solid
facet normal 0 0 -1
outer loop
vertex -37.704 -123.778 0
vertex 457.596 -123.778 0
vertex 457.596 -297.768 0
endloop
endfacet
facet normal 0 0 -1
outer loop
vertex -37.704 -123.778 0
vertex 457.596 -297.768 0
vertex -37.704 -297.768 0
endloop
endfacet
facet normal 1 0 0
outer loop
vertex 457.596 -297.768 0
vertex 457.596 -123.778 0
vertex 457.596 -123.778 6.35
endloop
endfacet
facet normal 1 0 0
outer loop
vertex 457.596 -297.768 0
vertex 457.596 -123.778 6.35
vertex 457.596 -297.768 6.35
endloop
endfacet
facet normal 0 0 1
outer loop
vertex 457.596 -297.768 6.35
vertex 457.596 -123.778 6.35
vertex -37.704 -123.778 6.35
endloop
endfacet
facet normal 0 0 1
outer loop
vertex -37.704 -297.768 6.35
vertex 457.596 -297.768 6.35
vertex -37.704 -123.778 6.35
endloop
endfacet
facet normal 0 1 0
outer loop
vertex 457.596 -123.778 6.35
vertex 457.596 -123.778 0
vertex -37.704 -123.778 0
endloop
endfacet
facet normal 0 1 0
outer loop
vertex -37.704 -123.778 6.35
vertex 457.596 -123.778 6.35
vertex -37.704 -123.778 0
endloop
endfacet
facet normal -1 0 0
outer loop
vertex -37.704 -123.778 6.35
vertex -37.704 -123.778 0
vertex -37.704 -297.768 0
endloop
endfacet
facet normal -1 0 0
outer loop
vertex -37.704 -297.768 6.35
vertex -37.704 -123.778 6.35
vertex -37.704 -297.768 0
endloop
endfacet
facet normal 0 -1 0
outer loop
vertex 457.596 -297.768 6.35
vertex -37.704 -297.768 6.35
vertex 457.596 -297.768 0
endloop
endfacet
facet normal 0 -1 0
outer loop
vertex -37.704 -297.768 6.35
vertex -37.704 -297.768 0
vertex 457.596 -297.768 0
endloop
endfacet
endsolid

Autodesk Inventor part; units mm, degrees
ref_plane "YZ Plane" through (0, 0, 0) normal (1, 0, 0) x (0, 1, 0)
ref_plane "XZ Plane" through (0, 0, 0) normal (0, 1, 0) x (-1, 0, 0)
ref_plane "XY Plane" through (0, 0, 0) normal (0, 0, 1) x (1, 0, 0)
sketch "Sketch1" plane through (0, 0, 0) normal (0, 0, 1) x (1, 0, 0)
  line L0 (-37.7036, 22.272) -> (457.5964, 22.272)
  line L1 (457.5964, 22.272) -> (457.5964, -304.118)
  line L2 (457.5964, -304.118) -> (-37.7036, -304.118)
  line L3 (-37.7036, -304.118) -> (-37.7036, 22.272)
  point P0 (0, 0)
  dimension "d0" = 495.3
  dimension "d1" = 326.39
extrude "Extrusion1" add sketch "Sketch1" along normal blind 6.35
sketch "Sketch2" plane through (0, 0, 6.35) normal (0, 0, 1) x (1, 0, 0)
  line L0 (-37.7036, 22.272) -> (457.5964, 22.272) projected
  line L1 (-37.7036, 22.272) -> (-18.6536, 22.272)
  line L2 (-18.6536, 22.272) -> (-18.6536, 15.922)
  line L3 (-18.6536, 15.922) -> (-37.7036, 15.922)
  line L4 (-37.7036, 15.922) -> (-37.7036, 22.272)
  line L5 (-18.6536, 15.922) -> (32.1464, 15.922)
  line L6 (32.1464, 15.922) -> (32.1464, 22.272)
  line L7 (32.1464, 22.272) -> (-18.6536, 22.272)
  line L8 (-18.6536, 22.272) -> (-18.6536, 15.922)
  line L9 (32.1464, 15.922) -> (82.9464, 15.922)
  line L10 (82.9464, 15.922) -> (82.9464, 22.272)
  line L11 (82.9464, 22.272) -> (32.1464, 22.272)
  line L12 (32.1464, 22.272) -> (32.1464, 15.922)
  line L13 (82.9464, 15.922) -> (133.7464, 15.922)
  line L14 (133.7464, 15.922) -> (133.7464, 22.272)
  line L15 (133.7464, 22.272) -> (82.9464, 22.272)
  line L16 (82.9464, 22.272) -> (82.9464, 15.922)
  line L17 (133.7464, 15.922) -> (184.5464, 15.922)
  line L18 (184.5464, 15.922) -> (184.5464, 22.272)
  line L19 (184.5464, 22.272) -> (133.7464, 22.272)
  line L20 (133.7464, 22.272) -> (133.7464, 15.922)
  line L21 (184.5464, 15.922) -> (235.3464, 15.922)
  line L22 (235.3464, 15.922) -> (235.3464, 22.272)
  line L23 (235.3464, 22.272) -> (184.5464, 22.272)
  line L24 (184.5464, 22.272) -> (184.5464, 15.922)
  line L25 (235.3464, 15.922) -> (286.1464, 15.922)
  line L26 (286.1464, 15.922) -> (286.1464, 22.272)
  line L27 (286.1464, 22.272) -> (235.3464, 22.272)
  line L28 (235.3464, 22.272) -> (235.3464, 15.922)
  line L29 (286.1464, 15.922) -> (336.9464, 15.922)
  line L30 (336.9464, 15.922) -> (336.9464, 22.272)
  line L31 (336.9464, 22.272) -> (286.1464, 22.272)
  line L32 (286.1464, 22.272) -> (286.1464, 15.922)
  line L33 (336.9464, 15.922) -> (387.7464, 15.922)
  line L34 (387.7464, 15.922) -> (387.7464, 22.272)
  line L35 (387.7464, 22.272) -> (336.9464, 22.272)
  line L36 (336.9464, 22.272) -> (336.9464, 15.922)
  line L37 (387.7464, 15.922) -> (438.5464, 15.922)
  line L38 (438.5464, 15.922) -> (438.5464, 22.272)
  line L39 (438.5464, 22.272) -> (387.7464, 22.272)
  line L40 (387.7464, 22.272) -> (387.7464, 15.922)
  line L41 (438.5464, 15.922) -> (457.5964, 15.922)
  line L42 (457.5964, 15.922) -> (457.5964, 22.272)
  line L43 (457.5964, 22.272) -> (438.5464, 22.272)
  line L44 (438.5464, 22.272) -> (438.5464, 15.922)
  point P0 (0, 0)
  dimension "d4" = 19.05
  dimension "d5" = 6.35
  dimension "d6" = 50.8
  dimension "d7" = 50.8
  dimension "d8" = 50.8
  dimension "d9" = 50.8
  dimension "d10" = 50.8
  dimension "d11" = 50.8
  dimension "d12" = 50.8
  dimension "d13" = 50.8
  dimension "d14" = 50.8
extrude "Extrusion2" cut sketch "Sketch2" against normal blind 6.35 contours L0 L2 L3 L4 | L0 L10 L9 L6 | L0 L18 L17 L14 | L0 L26 L25 L22 | L0 L34 L33 L30 | L0 L42 L41 L38
sketch "Sketch3" plane through (0, 0, 6.35) normal (0, 0, 1) x (1, 0, 0)
  line L0 (457.5964, -304.118) -> (-37.7036, -304.118) projected
  line L1 (-37.7036, -304.118) -> (-18.6536, -304.118)
  line L2 (-18.6536, -304.118) -> (-18.6536, -297.768)
  line L3 (-18.6536, -297.768) -> (-37.7036, -297.768)
  line L4 (-37.7036, -297.768) -> (-37.7036, -304.118)
  line L5 (-18.6536, -297.768) -> (32.1464, -297.768)
  line L6 (32.1464, -297.768) -> (32.1464, -304.118)
  line L7 (32.1464, -304.118) -> (-18.6536, -304.118)
  line L8 (-18.6536, -304.118) -> (-18.6536, -297.768)
  line L9 (32.1464, -304.118) -> (82.9464, -304.118)
  line L10 (82.9464, -304.118) -> (82.9464, -297.768)
  line L11 (82.9464, -297.768) -> (32.1464, -297.768)
  line L12 (32.1464, -297.768) -> (32.1464, -304.118)
  line L13 (82.9464, -297.768) -> (133.7464, -297.768)
  line L14 (133.7464, -297.768) -> (133.7464, -304.118)
  line L15 (133.7464, -304.118) -> (82.9464, -304.118)
  line L16 (82.9464, -304.118) -> (82.9464, -297.768)
  line L17 (133.7464, -297.768) -> (184.5464, -297.768)
  line L18 (184.5464, -297.768) -> (184.5464, -304.118)
  line L19 (184.5464, -304.118) -> (133.7464, -304.118)
  line L20 (133.7464, -304.118) -> (133.7464, -297.768)
  line L21 (184.5464, -297.768) -> (235.3464, -297.768)
  line L22 (235.3464, -297.768) -> (235.3464, -304.118)
  line L23 (235.3464, -304.118) -> (184.5464, -304.118)
  line L24 (184.5464, -304.118) -> (184.5464, -297.768)
  line L25 (235.3464, -304.118) -> (286.1464, -304.118)
  line L26 (286.1464, -304.118) -> (286.1464, -297.768)
  line L27 (286.1464, -297.768) -> (235.3464, -297.768)
  line L28 (235.3464, -297.768) -> (235.3464, -304.118)
  line L29 (286.1464, -297.768) -> (336.9464, -297.768)
  line L30 (336.9464, -297.768) -> (336.9464, -304.118)
  line L31 (336.9464, -304.118) -> (286.1464, -304.118)
  line L32 (286.1464, -304.118) -> (286.1464, -297.768)
  line L33 (336.9464, -297.768) -> (387.7464, -297.768)
  line L34 (387.7464, -297.768) -> (387.7464, -304.118)
  line L35 (387.7464, -304.118) -> (336.9464, -304.118)
  line L36 (336.9464, -304.118) -> (336.9464, -297.768)
  line L37 (387.7464, -297.768) -> (438.5464, -297.768)
  line L38 (438.5464, -297.768) -> (438.5464, -304.118)
  line L39 (438.5464, -304.118) -> (387.7464, -304.118)
  line L40 (387.7464, -304.118) -> (387.7464, -297.768)
  line L41 (438.5464, -297.768) -> (457.5964, -297.768)
  line L42 (457.5964, -297.768) -> (457.5964, -304.118)
  line L43 (457.5964, -304.118) -> (438.5464, -304.118)
  line L44 (438.5464, -304.118) -> (438.5464, -297.768)
  point P0 (0, 0)
  dimension "d17" = 19.05
  dimension "d18" = 6.35
extrude "Extrusion3" cut sketch "Sketch3" against normal blind 6.35 contours L0 L38 L41 L42 | L0 L30 L33 L34 | L0 L14 L17 L18 | L0 L6 L11 L10 | L0 L4 L3 L2
sketch "Sketch4" plane through (0, 0, 6.35) normal (0, 0, 1) x (1, 0, 0)
  line L0 (336.9464, -304.118) -> (184.5464, -304.118) projected
  line L1 (184.5464, -304.118) -> (235.3464, -304.118)
  line L2 (235.3464, -304.118) -> (286.1464, -304.118)
  line L3 (286.1464, -304.118) -> (286.1464, -297.768)
  line L4 (286.1464, -297.768) -> (235.3464, -297.768)
  line L5 (235.3464, -297.768) -> (235.3464, -304.118)
  point P0 (0, 0)
  dimension "d21" = 50.8
  dimension "d22" = 50.8
extrude "Extrusion4" cut sketch "Sketch4" against normal blind 6.35
sketch "Sketch5" plane through (0, 0, 6.35) normal (0, 0, 1) x (1, 0, 0)
  line L0 (457.5964, 15.922) -> (457.5964, -297.768) projected
  line L1 (-37.7036, -297.768) -> (-37.7036, 15.922) projected
  line L2 (-37.7036, -297.768) -> (-18.6536, -297.768) projected
  line L3 (457.5964, 15.922) -> (457.5964, -166.323)
  line L4 (457.5964, -166.323) -> (451.2464, -166.323)
  line L5 (451.2464, -166.323) -> (451.2464, -115.523)
  line L6 (451.2464, -115.523) -> (457.5964, -115.523)
  line L7 (457.5964, -115.523) -> (457.5964, -166.323)
  line L8 (451.2464, -115.523) -> (457.5964, -115.523)
  line L9 (457.5964, -115.523) -> (457.5964, -64.723)
  line L10 (457.5964, -64.723) -> (451.2464, -64.723)
  line L11 (451.2464, -64.723) -> (451.2464, -115.523)
  line L12 (451.2464, -64.723) -> (457.5964, -64.723)
  line L13 (457.5964, -64.723) -> (457.5964, -13.923)
  line L14 (457.5964, -13.923) -> (451.2464, -13.923)
  line L15 (451.2464, -13.923) -> (451.2464, -64.723)
  line L16 (451.2464, -166.323) -> (457.5964, -166.323)
  line L17 (457.5964, -166.323) -> (457.5964, -217.123)
  line L18 (457.5964, -217.123) -> (451.2464, -217.123)
  line L19 (451.2464, -217.123) -> (451.2464, -166.323)
  line L20 (451.2464, -217.123) -> (457.5964, -217.123)
  line L21 (457.5964, -217.123) -> (457.5964, -267.923)
  line L22 (457.5964, -267.923) -> (451.2464, -267.923)
  line L23 (451.2464, -267.923) -> (451.2464, -217.123)
  line L24 (451.2464, -267.923) -> (457.5964, -267.923)
  line L25 (457.5964, -267.923) -> (457.5964, -297.768)
  line L26 (457.5964, -297.768) -> (451.2464, -297.768)
  line L27 (451.2464, -297.768) -> (451.2464, -267.923)
  line L28 (451.2464, -13.923) -> (457.5964, -13.923)
  line L29 (457.5964, -13.923) -> (457.5964, 15.922)
  line L30 (457.5964, 15.922) -> (451.2464, 15.922)
  line L31 (451.2464, 15.922) -> (451.2464, -13.923)
  line L32 (-37.7036, 15.922) -> (-31.3536, 15.922)
  line L33 (-31.3536, 15.922) -> (-31.3536, -13.923)
  line L34 (-31.3536, -13.923) -> (-37.7036, -13.923)
  line L35 (-37.7036, -13.923) -> (-37.7036, 15.922)
  line L36 (-37.7036, -64.723) -> (-31.3536, -64.723)
  line L37 (-31.3536, -64.723) -> (-31.3536, -115.523)
  line L38 (-31.3536, -115.523) -> (-37.7036, -115.523)
  line L39 (-37.7036, -115.523) -> (-37.7036, -64.723)
  line L40 (-37.7036, -166.323) -> (-31.3536, -166.323)
  line L41 (-31.3536, -166.323) -> (-31.3536, -217.123)
  line L42 (-31.3536, -217.123) -> (-37.7036, -217.123)
  line L43 (-37.7036, -217.123) -> (-37.7036, -166.323)
  line L44 (-37.7036, -267.923) -> (-31.3536, -267.923)
  line L45 (-31.3536, -267.923) -> (-31.3536, -297.768)
  line L46 (-31.3536, -297.768) -> (-37.7036, -297.768)
  line L47 (-37.7036, -297.768) -> (-37.7036, -267.923)
  point P0 (0, 0)
  dimension "d25" = 182.245
  dimension "d26" = 6.35
  dimension "d27" = 50.8
  dimension "d28" = 50.8
  dimension "d29" = 50.8
  dimension "d30" = 50.8
  dimension "d31" = 50.8
  dimension "d32" = 6.35
extrude "Extrusion5" cut sketch "Sketch5" against normal blind 6.35 contours L0 L14 L31 L30 | L0 L18 L19 L4 | L0 L26 L27 L22 | L1 L32 L33 L34 | L1 L36 L37 L38 | L1 L40 L41 L42 | L1 L44 L45 L2
sketch "Sketch6" plane through (0, 0, 6.35) normal (0, 0, 1) x (1, 0, 0)
  line L0 (457.5964, -13.923) -> (457.5964, -166.323) projected
  line L1 (457.5964, -13.923) -> (457.5964, -64.723)
  line L2 (457.5964, -64.723) -> (451.2464, -64.723)
  line L3 (451.2464, -64.723) -> (451.2464, -115.523)
  line L4 (451.2464, -115.523) -> (457.5964, -115.523)
  line L5 (457.5964, -115.523) -> (457.5964, -64.723)
  point P0 (0, 0)
extrude "Extrusion6" cut sketch "Sketch6" against normal blind 6.35
sketch "Sketch7" plane through (0, 0, 6.35) normal (0, 0, 1) x (1, 0, 0)
  line L0 (451.2464, -13.923) -> (451.2464, 15.922) projected
  line L1 (387.7464, 15.922) -> (336.9464, 15.922) projected
  line L2 (82.9464, 15.922) -> (32.1464, 15.922) projected
  line L3 (-31.3536, 15.922) -> (-31.3536, -13.923) projected
  line L4 (451.2464, -115.523) -> (451.2464, -64.723) projected
  line L5 (-31.3536, -6.7444) -> (44.8464, -6.7444)
  line L6 (44.8464, -6.7444) -> (44.8464, 15.922)
  line L7 (44.8464, 15.922) -> (44.8464, -60.278)
  line L8 (451.2464, -6.7444) -> (375.0464, -6.7444)
  line L9 (375.0464, -6.7444) -> (375.0464, 15.922)
  line L10 (375.0464, 15.922) -> (375.0464, -60.278)
  circle A0 centre (44.8464, -60.278) radius 25.4
  circle A1 centre (375.0464, -60.278) radius 25.4
  point P0 (0, 0)
  dimension "d37" = 76.2
  dimension "d38" = 76.2
  dimension "d39" = 76.2
  dimension "d40" = 76.2
  dimension "d41" = 50.8
  dimension "d42" = 50.8
extrude "Extrusion7" cut sketch "Sketch7" against normal blind 25.4
sketch "Sketch8" plane through (0, 0, 6.35) normal (0, 0, 1) x (1, 0, 0)
  circle A0 centre (44.8464, -60.278) radius 25.4 projected
  circle A1 centre (375.0464, -60.278) radius 25.4 projected
  point P0 (0, 0)
extrude "Extrusion8" add sketch "Sketch8" against normal blind 6.35
sketch "Sketch9" plane through (0, 0, 0) normal (0, 0, -1) x (-1, 0, 0)
  line L0 (-457.5964, -64.723) -> (-451.2464, -64.723) projected
  line L1 (-451.2464, -64.723) -> (-451.2464, -115.523) projected
  line L2 (-451.2464, -115.523) -> (-457.5964, -115.523) projected
  line L3 (-457.5964, -115.523) -> (-457.5964, -166.323) projected
  line L4 (-457.5964, -166.323) -> (-451.2464, -166.323) projected
  line L5 (-451.2464, -166.323) -> (-451.2464, -217.123) projected
  line L6 (-451.2464, -217.123) -> (-457.5964, -217.123) projected
  line L7 (-457.5964, -217.123) -> (-457.5964, -267.923) projected
  line L8 (-457.5964, -267.923) -> (-451.2464, -267.923) projected
  line L9 (-451.2464, -267.923) -> (-451.2464, -297.768) projected
  line L10 (-451.2464, -297.768) -> (-438.5464, -297.768) projected
  line L11 (-438.5464, -297.768) -> (-438.5464, -304.118) projected
  line L12 (-438.5464, -304.118) -> (-387.7464, -304.118) projected
  line L13 (-387.7464, -304.118) -> (-387.7464, -297.768) projected
  line L14 (-387.7464, -297.768) -> (-336.9464, -297.768) projected
  line L15 (-336.9464, -297.768) -> (-336.9464, -304.118) projected
  line L16 (-336.9464, -304.118) -> (-286.1464, -304.118) projected
  line L17 (-286.1464, -304.118) -> (-286.1464, -297.768) projected
  line L18 (-286.1464, -297.768) -> (-235.3464, -297.768) projected
  line L19 (-235.3464, -297.768) -> (-235.3464, -304.118) projected
  line L20 (-235.3464, -304.118) -> (-184.5464, -304.118) projected
  line L21 (-184.5464, -304.118) -> (-184.5464, -297.768) projected
  line L22 (-184.5464, -297.768) -> (-133.7464, -297.768) projected
  line L23 (-133.7464, -297.768) -> (-133.7464, -304.118) projected
  line L24 (-133.7464, -304.118) -> (-82.9464, -304.118) projected
  line L25 (-82.9464, -304.118) -> (-82.9464, -297.768) projected
  line L26 (-82.9464, -297.768) -> (-32.1464, -297.768) projected
  line L27 (-32.1464, -297.768) -> (-32.1464, -304.118) projected
  line L28 (-32.1464, -304.118) -> (18.6536, -304.118) projected
  line L29 (18.6536, -304.118) -> (18.6536, -297.768) projected
  line L30 (18.6536, -297.768) -> (31.3536, -297.768) projected
  line L31 (31.3536, -297.768) -> (31.3536, -267.923) projected
  line L32 (31.3536, -267.923) -> (37.7036, -267.923) projected
  line L33 (37.7036, -267.923) -> (37.7036, -217.123) projected
  line L34 (37.7036, -217.123) -> (31.3536, -217.123) projected
  line L35 (31.3536, -217.123) -> (31.3536, -166.323) projected
  line L36 (31.3536, -166.323) -> (37.7036, -166.323) projected
  line L37 (37.7036, -166.323) -> (37.7036, -115.523) projected
  line L38 (37.7036, -115.523) -> (31.3536, -115.523) projected
  line L39 (31.3536, -115.523) -> (31.3536, -64.723) projected
  line L40 (31.3536, -64.723) -> (37.7036, -64.723) projected
  line L41 (37.7036, -64.723) -> (37.7036, -13.923) projected
  line L42 (37.7036, -13.923) -> (31.3536, -13.923) projected
  line L43 (31.3536, -13.923) -> (31.3536, 15.922) projected
  line L44 (31.3536, 15.922) -> (18.6536, 15.922) projected
  line L45 (18.6536, 15.922) -> (18.6536, 22.272) projected
  line L46 (18.6536, 22.272) -> (-32.1464, 22.272) projected
  line L47 (-32.1464, 22.272) -> (-32.1464, 15.922) projected
  line L48 (-32.1464, 15.922) -> (-82.9464, 15.922) projected
  line L49 (-82.9464, 15.922) -> (-82.9464, 22.272) projected
  line L50 (-82.9464, 22.272) -> (-133.7464, 22.272) projected
  line L51 (-133.7464, 22.272) -> (-133.7464, 15.922) projected
  line L52 (-133.7464, 15.922) -> (-184.5464, 15.922) projected
  line L53 (-184.5464, 15.922) -> (-184.5464, 22.272) projected
  line L54 (-184.5464, 22.272) -> (-235.3464, 22.272) projected
  line L55 (-235.3464, 22.272) -> (-235.3464, 15.922) projected
  line L56 (-235.3464, 15.922) -> (-286.1464, 15.922) projected
  line L57 (-286.1464, 15.922) -> (-286.1464, 22.272) projected
  line L58 (-286.1464, 22.272) -> (-336.9464, 22.272) projected
  line L59 (-336.9464, 22.272) -> (-336.9464, 15.922) projected
  line L60 (-336.9464, 15.922) -> (-387.7464, 15.922) projected
  line L61 (-387.7464, 15.922) -> (-387.7464, 22.272) projected
  line L62 (-387.7464, 22.272) -> (-438.5464, 22.272) projected
  line L63 (-438.5464, 22.272) -> (-438.5464, 15.922) projected
  line L64 (-438.5464, 15.922) -> (-451.2464, 15.922) projected
  line L65 (-451.2464, 15.922) -> (-451.2464, -13.923) projected
  line L66 (-451.2464, -13.923) -> (-457.5964, -13.923) projected
  line L67 (-457.5964, -13.923) -> (-457.5964, -64.723) projected
  line L68 (18.6536, 15.922) -> (-438.5464, 15.922)
  point P0 (0, 0)
extrude "Extrusion9" cut sketch "Sketch9" against normal blind 25.4 contours L63 L62 L61 L68 | L59 L58 L57 L68 | L55 L54 L53 L68 | L51 L50 L49 L68 | L47 L46 L45 L68
sketch "Sketch10" plane through (0, 0, 0) normal (0, 0, -1) x (-1, 0, 0)
  line L0 (31.3536, 15.922) -> (-451.2464, 15.922) projected
  line L1 (-451.2464, 15.922) -> (-451.2464, -13.923) projected
  line L2 (-451.2464, -13.923) -> (-457.5964, -13.923) projected
  line L3 (-457.5964, -13.923) -> (-457.5964, -64.723) projected
  line L4 (-457.5964, -64.723) -> (-451.2464, -64.723) projected
  line L5 (-451.2464, -64.723) -> (-451.2464, -115.523) projected
  line L6 (-451.2464, -115.523) -> (-457.5964, -115.523) projected
  line L7 (-457.5964, -115.523) -> (-457.5964, -166.323) projected
  line L8 (-457.5964, -166.323) -> (-451.2464, -166.323) projected
  line L9 (-451.2464, -166.323) -> (-451.2464, -217.123) projected
  line L10 (-451.2464, -217.123) -> (-457.5964, -217.123) projected
  line L11 (-457.5964, -217.123) -> (-457.5964, -267.923) projected
  line L12 (-457.5964, -267.923) -> (-451.2464, -267.923) projected
  line L13 (-451.2464, -267.923) -> (-451.2464, -297.768) projected
  line L14 (-451.2464, -297.768) -> (-438.5464, -297.768) projected
  line L15 (-438.5464, -297.768) -> (-438.5464, -304.118) projected
  line L16 (-438.5464, -304.118) -> (-387.7464, -304.118) projected
  line L17 (-387.7464, -304.118) -> (-387.7464, -297.768) projected
  line L18 (-387.7464, -297.768) -> (-336.9464, -297.768) projected
  line L19 (-336.9464, -297.768) -> (-336.9464, -304.118) projected
  line L20 (-336.9464, -304.118) -> (-286.1464, -304.118) projected
  line L21 (-286.1464, -304.118) -> (-286.1464, -297.768) projected
  line L22 (-286.1464, -297.768) -> (-235.3464, -297.768) projected
  line L23 (-235.3464, -297.768) -> (-235.3464, -304.118) projected
  line L24 (-235.3464, -304.118) -> (-184.5464, -304.118) projected
  line L25 (-184.5464, -304.118) -> (-184.5464, -297.768) projected
  line L26 (-184.5464, -297.768) -> (-133.7464, -297.768) projected
  line L27 (-133.7464, -297.768) -> (-133.7464, -304.118) projected
  line L28 (-133.7464, -304.118) -> (-82.9464, -304.118) projected
  line L29 (-82.9464, -304.118) -> (-82.9464, -297.768) projected
  line L30 (-82.9464, -297.768) -> (-32.1464, -297.768) projected
  line L31 (-32.1464, -297.768) -> (-32.1464, -304.118) projected
  line L32 (-32.1464, -304.118) -> (18.6536, -304.118) projected
  line L33 (18.6536, -304.118) -> (18.6536, -297.768) projected
  line L34 (18.6536, -297.768) -> (31.3536, -297.768) projected
  line L35 (31.3536, -297.768) -> (31.3536, -267.923) projected
  line L36 (31.3536, -267.923) -> (37.7036, -267.923) projected
  line L37 (37.7036, -267.923) -> (37.7036, -217.123) projected
  line L38 (37.7036, -217.123) -> (31.3536, -217.123) projected
  line L39 (31.3536, -217.123) -> (31.3536, -166.323) projected
  line L40 (31.3536, -166.323) -> (37.7036, -166.323) projected
  line L41 (37.7036, -166.323) -> (37.7036, -115.523) projected
  line L42 (37.7036, -115.523) -> (31.3536, -115.523) projected
  line L43 (31.3536, -115.523) -> (31.3536, -64.723) projected
  line L44 (31.3536, -64.723) -> (37.7036, -64.723) projected
  line L45 (37.7036, -64.723) -> (37.7036, -13.923) projected
  line L46 (37.7036, -13.923) -> (31.3536, -13.923) projected
  line L47 (31.3536, -13.923) -> (31.3536, 15.922) projected
  line L48 (18.6536, -297.768) -> (-438.5464, -297.768)
  point P0 (0, 0)
extrude "Extrusion10" cut sketch "Sketch10" against normal blind 25.4 contours L33 L32 L31 L48 | L48 L17 L16 L15 | L29 L28 L27 L48 | L48 L21 L20 L19 | L25 L24 L23 L48
sketch "Sketch11" plane through (0, 0, 0) normal (0, 0, -1) x (-1, 0, 0)
  line L0 (37.7036, -297.768) -> (-457.5964, -297.768)
  line L1 (-457.5964, -297.768) -> (-457.5964, 15.922)
  line L2 (-457.5964, 15.922) -> (37.7036, 15.922)
  line L3 (37.7036, 15.922) -> (37.7036, -297.768)
  point P0 (0, 0)
extrude "Extrusion11" add sketch "Sketch11" against normal blind 6.35
sketch "Sketch12" plane through (0, 0, 0) normal (0, 0, -1) x (-1, 0, 0)
  line L0 (37.7036, 15.922) -> (-457.5964, 15.922) projected
  line L1 (-457.5964, 15.922) -> (-457.5964, -297.768) projected
  line L2 (-457.5964, 15.922) -> (-457.5964, -123.778)
  line L3 (-457.5964, -123.778) -> (-289.1944, -123.778)
  line L4 (-289.1944, -123.778) -> (-289.1944, 15.922)
  line L5 (37.7036, 15.922) -> (-130.6984, 15.922)
  line L6 (-130.6984, 15.922) -> (-130.6984, -123.778)
  line L7 (-130.6984, -123.778) -> (37.7036, -123.778)
  line L8 (37.7036, -123.778) -> (37.7036, 15.922)
  point P0 (0, 0)
  dimension "d53" = 139.7
  dimension "d54" = 168.402
  dimension "d55" = 168.402
  dimension "d56" = 139.7
extrude "Extrusion12" cut sketch "Sketch12" against normal blind 25.4
sketch "Sketch13" plane through (0, 0, 0) normal (0, 0, -1) x (-1, 0, 0)
  line L0 (-130.6984, -123.778) -> (-130.6984, 15.922) projected
  line L1 (-130.6984, 15.922) -> (-289.1944, 15.922) projected
  line L2 (-289.1944, 15.922) -> (-289.1944, -123.778) projected
  line L3 (37.7036, -123.778) -> (37.7036, -297.768) projected
  line L4 (-130.6984, -123.778) -> (-289.1944, -123.778)
  point P0 (0, 0)
extrude "Extrusion13" cut sketch "Sketch13" against normal blind 25.4
properties part number "it top"
